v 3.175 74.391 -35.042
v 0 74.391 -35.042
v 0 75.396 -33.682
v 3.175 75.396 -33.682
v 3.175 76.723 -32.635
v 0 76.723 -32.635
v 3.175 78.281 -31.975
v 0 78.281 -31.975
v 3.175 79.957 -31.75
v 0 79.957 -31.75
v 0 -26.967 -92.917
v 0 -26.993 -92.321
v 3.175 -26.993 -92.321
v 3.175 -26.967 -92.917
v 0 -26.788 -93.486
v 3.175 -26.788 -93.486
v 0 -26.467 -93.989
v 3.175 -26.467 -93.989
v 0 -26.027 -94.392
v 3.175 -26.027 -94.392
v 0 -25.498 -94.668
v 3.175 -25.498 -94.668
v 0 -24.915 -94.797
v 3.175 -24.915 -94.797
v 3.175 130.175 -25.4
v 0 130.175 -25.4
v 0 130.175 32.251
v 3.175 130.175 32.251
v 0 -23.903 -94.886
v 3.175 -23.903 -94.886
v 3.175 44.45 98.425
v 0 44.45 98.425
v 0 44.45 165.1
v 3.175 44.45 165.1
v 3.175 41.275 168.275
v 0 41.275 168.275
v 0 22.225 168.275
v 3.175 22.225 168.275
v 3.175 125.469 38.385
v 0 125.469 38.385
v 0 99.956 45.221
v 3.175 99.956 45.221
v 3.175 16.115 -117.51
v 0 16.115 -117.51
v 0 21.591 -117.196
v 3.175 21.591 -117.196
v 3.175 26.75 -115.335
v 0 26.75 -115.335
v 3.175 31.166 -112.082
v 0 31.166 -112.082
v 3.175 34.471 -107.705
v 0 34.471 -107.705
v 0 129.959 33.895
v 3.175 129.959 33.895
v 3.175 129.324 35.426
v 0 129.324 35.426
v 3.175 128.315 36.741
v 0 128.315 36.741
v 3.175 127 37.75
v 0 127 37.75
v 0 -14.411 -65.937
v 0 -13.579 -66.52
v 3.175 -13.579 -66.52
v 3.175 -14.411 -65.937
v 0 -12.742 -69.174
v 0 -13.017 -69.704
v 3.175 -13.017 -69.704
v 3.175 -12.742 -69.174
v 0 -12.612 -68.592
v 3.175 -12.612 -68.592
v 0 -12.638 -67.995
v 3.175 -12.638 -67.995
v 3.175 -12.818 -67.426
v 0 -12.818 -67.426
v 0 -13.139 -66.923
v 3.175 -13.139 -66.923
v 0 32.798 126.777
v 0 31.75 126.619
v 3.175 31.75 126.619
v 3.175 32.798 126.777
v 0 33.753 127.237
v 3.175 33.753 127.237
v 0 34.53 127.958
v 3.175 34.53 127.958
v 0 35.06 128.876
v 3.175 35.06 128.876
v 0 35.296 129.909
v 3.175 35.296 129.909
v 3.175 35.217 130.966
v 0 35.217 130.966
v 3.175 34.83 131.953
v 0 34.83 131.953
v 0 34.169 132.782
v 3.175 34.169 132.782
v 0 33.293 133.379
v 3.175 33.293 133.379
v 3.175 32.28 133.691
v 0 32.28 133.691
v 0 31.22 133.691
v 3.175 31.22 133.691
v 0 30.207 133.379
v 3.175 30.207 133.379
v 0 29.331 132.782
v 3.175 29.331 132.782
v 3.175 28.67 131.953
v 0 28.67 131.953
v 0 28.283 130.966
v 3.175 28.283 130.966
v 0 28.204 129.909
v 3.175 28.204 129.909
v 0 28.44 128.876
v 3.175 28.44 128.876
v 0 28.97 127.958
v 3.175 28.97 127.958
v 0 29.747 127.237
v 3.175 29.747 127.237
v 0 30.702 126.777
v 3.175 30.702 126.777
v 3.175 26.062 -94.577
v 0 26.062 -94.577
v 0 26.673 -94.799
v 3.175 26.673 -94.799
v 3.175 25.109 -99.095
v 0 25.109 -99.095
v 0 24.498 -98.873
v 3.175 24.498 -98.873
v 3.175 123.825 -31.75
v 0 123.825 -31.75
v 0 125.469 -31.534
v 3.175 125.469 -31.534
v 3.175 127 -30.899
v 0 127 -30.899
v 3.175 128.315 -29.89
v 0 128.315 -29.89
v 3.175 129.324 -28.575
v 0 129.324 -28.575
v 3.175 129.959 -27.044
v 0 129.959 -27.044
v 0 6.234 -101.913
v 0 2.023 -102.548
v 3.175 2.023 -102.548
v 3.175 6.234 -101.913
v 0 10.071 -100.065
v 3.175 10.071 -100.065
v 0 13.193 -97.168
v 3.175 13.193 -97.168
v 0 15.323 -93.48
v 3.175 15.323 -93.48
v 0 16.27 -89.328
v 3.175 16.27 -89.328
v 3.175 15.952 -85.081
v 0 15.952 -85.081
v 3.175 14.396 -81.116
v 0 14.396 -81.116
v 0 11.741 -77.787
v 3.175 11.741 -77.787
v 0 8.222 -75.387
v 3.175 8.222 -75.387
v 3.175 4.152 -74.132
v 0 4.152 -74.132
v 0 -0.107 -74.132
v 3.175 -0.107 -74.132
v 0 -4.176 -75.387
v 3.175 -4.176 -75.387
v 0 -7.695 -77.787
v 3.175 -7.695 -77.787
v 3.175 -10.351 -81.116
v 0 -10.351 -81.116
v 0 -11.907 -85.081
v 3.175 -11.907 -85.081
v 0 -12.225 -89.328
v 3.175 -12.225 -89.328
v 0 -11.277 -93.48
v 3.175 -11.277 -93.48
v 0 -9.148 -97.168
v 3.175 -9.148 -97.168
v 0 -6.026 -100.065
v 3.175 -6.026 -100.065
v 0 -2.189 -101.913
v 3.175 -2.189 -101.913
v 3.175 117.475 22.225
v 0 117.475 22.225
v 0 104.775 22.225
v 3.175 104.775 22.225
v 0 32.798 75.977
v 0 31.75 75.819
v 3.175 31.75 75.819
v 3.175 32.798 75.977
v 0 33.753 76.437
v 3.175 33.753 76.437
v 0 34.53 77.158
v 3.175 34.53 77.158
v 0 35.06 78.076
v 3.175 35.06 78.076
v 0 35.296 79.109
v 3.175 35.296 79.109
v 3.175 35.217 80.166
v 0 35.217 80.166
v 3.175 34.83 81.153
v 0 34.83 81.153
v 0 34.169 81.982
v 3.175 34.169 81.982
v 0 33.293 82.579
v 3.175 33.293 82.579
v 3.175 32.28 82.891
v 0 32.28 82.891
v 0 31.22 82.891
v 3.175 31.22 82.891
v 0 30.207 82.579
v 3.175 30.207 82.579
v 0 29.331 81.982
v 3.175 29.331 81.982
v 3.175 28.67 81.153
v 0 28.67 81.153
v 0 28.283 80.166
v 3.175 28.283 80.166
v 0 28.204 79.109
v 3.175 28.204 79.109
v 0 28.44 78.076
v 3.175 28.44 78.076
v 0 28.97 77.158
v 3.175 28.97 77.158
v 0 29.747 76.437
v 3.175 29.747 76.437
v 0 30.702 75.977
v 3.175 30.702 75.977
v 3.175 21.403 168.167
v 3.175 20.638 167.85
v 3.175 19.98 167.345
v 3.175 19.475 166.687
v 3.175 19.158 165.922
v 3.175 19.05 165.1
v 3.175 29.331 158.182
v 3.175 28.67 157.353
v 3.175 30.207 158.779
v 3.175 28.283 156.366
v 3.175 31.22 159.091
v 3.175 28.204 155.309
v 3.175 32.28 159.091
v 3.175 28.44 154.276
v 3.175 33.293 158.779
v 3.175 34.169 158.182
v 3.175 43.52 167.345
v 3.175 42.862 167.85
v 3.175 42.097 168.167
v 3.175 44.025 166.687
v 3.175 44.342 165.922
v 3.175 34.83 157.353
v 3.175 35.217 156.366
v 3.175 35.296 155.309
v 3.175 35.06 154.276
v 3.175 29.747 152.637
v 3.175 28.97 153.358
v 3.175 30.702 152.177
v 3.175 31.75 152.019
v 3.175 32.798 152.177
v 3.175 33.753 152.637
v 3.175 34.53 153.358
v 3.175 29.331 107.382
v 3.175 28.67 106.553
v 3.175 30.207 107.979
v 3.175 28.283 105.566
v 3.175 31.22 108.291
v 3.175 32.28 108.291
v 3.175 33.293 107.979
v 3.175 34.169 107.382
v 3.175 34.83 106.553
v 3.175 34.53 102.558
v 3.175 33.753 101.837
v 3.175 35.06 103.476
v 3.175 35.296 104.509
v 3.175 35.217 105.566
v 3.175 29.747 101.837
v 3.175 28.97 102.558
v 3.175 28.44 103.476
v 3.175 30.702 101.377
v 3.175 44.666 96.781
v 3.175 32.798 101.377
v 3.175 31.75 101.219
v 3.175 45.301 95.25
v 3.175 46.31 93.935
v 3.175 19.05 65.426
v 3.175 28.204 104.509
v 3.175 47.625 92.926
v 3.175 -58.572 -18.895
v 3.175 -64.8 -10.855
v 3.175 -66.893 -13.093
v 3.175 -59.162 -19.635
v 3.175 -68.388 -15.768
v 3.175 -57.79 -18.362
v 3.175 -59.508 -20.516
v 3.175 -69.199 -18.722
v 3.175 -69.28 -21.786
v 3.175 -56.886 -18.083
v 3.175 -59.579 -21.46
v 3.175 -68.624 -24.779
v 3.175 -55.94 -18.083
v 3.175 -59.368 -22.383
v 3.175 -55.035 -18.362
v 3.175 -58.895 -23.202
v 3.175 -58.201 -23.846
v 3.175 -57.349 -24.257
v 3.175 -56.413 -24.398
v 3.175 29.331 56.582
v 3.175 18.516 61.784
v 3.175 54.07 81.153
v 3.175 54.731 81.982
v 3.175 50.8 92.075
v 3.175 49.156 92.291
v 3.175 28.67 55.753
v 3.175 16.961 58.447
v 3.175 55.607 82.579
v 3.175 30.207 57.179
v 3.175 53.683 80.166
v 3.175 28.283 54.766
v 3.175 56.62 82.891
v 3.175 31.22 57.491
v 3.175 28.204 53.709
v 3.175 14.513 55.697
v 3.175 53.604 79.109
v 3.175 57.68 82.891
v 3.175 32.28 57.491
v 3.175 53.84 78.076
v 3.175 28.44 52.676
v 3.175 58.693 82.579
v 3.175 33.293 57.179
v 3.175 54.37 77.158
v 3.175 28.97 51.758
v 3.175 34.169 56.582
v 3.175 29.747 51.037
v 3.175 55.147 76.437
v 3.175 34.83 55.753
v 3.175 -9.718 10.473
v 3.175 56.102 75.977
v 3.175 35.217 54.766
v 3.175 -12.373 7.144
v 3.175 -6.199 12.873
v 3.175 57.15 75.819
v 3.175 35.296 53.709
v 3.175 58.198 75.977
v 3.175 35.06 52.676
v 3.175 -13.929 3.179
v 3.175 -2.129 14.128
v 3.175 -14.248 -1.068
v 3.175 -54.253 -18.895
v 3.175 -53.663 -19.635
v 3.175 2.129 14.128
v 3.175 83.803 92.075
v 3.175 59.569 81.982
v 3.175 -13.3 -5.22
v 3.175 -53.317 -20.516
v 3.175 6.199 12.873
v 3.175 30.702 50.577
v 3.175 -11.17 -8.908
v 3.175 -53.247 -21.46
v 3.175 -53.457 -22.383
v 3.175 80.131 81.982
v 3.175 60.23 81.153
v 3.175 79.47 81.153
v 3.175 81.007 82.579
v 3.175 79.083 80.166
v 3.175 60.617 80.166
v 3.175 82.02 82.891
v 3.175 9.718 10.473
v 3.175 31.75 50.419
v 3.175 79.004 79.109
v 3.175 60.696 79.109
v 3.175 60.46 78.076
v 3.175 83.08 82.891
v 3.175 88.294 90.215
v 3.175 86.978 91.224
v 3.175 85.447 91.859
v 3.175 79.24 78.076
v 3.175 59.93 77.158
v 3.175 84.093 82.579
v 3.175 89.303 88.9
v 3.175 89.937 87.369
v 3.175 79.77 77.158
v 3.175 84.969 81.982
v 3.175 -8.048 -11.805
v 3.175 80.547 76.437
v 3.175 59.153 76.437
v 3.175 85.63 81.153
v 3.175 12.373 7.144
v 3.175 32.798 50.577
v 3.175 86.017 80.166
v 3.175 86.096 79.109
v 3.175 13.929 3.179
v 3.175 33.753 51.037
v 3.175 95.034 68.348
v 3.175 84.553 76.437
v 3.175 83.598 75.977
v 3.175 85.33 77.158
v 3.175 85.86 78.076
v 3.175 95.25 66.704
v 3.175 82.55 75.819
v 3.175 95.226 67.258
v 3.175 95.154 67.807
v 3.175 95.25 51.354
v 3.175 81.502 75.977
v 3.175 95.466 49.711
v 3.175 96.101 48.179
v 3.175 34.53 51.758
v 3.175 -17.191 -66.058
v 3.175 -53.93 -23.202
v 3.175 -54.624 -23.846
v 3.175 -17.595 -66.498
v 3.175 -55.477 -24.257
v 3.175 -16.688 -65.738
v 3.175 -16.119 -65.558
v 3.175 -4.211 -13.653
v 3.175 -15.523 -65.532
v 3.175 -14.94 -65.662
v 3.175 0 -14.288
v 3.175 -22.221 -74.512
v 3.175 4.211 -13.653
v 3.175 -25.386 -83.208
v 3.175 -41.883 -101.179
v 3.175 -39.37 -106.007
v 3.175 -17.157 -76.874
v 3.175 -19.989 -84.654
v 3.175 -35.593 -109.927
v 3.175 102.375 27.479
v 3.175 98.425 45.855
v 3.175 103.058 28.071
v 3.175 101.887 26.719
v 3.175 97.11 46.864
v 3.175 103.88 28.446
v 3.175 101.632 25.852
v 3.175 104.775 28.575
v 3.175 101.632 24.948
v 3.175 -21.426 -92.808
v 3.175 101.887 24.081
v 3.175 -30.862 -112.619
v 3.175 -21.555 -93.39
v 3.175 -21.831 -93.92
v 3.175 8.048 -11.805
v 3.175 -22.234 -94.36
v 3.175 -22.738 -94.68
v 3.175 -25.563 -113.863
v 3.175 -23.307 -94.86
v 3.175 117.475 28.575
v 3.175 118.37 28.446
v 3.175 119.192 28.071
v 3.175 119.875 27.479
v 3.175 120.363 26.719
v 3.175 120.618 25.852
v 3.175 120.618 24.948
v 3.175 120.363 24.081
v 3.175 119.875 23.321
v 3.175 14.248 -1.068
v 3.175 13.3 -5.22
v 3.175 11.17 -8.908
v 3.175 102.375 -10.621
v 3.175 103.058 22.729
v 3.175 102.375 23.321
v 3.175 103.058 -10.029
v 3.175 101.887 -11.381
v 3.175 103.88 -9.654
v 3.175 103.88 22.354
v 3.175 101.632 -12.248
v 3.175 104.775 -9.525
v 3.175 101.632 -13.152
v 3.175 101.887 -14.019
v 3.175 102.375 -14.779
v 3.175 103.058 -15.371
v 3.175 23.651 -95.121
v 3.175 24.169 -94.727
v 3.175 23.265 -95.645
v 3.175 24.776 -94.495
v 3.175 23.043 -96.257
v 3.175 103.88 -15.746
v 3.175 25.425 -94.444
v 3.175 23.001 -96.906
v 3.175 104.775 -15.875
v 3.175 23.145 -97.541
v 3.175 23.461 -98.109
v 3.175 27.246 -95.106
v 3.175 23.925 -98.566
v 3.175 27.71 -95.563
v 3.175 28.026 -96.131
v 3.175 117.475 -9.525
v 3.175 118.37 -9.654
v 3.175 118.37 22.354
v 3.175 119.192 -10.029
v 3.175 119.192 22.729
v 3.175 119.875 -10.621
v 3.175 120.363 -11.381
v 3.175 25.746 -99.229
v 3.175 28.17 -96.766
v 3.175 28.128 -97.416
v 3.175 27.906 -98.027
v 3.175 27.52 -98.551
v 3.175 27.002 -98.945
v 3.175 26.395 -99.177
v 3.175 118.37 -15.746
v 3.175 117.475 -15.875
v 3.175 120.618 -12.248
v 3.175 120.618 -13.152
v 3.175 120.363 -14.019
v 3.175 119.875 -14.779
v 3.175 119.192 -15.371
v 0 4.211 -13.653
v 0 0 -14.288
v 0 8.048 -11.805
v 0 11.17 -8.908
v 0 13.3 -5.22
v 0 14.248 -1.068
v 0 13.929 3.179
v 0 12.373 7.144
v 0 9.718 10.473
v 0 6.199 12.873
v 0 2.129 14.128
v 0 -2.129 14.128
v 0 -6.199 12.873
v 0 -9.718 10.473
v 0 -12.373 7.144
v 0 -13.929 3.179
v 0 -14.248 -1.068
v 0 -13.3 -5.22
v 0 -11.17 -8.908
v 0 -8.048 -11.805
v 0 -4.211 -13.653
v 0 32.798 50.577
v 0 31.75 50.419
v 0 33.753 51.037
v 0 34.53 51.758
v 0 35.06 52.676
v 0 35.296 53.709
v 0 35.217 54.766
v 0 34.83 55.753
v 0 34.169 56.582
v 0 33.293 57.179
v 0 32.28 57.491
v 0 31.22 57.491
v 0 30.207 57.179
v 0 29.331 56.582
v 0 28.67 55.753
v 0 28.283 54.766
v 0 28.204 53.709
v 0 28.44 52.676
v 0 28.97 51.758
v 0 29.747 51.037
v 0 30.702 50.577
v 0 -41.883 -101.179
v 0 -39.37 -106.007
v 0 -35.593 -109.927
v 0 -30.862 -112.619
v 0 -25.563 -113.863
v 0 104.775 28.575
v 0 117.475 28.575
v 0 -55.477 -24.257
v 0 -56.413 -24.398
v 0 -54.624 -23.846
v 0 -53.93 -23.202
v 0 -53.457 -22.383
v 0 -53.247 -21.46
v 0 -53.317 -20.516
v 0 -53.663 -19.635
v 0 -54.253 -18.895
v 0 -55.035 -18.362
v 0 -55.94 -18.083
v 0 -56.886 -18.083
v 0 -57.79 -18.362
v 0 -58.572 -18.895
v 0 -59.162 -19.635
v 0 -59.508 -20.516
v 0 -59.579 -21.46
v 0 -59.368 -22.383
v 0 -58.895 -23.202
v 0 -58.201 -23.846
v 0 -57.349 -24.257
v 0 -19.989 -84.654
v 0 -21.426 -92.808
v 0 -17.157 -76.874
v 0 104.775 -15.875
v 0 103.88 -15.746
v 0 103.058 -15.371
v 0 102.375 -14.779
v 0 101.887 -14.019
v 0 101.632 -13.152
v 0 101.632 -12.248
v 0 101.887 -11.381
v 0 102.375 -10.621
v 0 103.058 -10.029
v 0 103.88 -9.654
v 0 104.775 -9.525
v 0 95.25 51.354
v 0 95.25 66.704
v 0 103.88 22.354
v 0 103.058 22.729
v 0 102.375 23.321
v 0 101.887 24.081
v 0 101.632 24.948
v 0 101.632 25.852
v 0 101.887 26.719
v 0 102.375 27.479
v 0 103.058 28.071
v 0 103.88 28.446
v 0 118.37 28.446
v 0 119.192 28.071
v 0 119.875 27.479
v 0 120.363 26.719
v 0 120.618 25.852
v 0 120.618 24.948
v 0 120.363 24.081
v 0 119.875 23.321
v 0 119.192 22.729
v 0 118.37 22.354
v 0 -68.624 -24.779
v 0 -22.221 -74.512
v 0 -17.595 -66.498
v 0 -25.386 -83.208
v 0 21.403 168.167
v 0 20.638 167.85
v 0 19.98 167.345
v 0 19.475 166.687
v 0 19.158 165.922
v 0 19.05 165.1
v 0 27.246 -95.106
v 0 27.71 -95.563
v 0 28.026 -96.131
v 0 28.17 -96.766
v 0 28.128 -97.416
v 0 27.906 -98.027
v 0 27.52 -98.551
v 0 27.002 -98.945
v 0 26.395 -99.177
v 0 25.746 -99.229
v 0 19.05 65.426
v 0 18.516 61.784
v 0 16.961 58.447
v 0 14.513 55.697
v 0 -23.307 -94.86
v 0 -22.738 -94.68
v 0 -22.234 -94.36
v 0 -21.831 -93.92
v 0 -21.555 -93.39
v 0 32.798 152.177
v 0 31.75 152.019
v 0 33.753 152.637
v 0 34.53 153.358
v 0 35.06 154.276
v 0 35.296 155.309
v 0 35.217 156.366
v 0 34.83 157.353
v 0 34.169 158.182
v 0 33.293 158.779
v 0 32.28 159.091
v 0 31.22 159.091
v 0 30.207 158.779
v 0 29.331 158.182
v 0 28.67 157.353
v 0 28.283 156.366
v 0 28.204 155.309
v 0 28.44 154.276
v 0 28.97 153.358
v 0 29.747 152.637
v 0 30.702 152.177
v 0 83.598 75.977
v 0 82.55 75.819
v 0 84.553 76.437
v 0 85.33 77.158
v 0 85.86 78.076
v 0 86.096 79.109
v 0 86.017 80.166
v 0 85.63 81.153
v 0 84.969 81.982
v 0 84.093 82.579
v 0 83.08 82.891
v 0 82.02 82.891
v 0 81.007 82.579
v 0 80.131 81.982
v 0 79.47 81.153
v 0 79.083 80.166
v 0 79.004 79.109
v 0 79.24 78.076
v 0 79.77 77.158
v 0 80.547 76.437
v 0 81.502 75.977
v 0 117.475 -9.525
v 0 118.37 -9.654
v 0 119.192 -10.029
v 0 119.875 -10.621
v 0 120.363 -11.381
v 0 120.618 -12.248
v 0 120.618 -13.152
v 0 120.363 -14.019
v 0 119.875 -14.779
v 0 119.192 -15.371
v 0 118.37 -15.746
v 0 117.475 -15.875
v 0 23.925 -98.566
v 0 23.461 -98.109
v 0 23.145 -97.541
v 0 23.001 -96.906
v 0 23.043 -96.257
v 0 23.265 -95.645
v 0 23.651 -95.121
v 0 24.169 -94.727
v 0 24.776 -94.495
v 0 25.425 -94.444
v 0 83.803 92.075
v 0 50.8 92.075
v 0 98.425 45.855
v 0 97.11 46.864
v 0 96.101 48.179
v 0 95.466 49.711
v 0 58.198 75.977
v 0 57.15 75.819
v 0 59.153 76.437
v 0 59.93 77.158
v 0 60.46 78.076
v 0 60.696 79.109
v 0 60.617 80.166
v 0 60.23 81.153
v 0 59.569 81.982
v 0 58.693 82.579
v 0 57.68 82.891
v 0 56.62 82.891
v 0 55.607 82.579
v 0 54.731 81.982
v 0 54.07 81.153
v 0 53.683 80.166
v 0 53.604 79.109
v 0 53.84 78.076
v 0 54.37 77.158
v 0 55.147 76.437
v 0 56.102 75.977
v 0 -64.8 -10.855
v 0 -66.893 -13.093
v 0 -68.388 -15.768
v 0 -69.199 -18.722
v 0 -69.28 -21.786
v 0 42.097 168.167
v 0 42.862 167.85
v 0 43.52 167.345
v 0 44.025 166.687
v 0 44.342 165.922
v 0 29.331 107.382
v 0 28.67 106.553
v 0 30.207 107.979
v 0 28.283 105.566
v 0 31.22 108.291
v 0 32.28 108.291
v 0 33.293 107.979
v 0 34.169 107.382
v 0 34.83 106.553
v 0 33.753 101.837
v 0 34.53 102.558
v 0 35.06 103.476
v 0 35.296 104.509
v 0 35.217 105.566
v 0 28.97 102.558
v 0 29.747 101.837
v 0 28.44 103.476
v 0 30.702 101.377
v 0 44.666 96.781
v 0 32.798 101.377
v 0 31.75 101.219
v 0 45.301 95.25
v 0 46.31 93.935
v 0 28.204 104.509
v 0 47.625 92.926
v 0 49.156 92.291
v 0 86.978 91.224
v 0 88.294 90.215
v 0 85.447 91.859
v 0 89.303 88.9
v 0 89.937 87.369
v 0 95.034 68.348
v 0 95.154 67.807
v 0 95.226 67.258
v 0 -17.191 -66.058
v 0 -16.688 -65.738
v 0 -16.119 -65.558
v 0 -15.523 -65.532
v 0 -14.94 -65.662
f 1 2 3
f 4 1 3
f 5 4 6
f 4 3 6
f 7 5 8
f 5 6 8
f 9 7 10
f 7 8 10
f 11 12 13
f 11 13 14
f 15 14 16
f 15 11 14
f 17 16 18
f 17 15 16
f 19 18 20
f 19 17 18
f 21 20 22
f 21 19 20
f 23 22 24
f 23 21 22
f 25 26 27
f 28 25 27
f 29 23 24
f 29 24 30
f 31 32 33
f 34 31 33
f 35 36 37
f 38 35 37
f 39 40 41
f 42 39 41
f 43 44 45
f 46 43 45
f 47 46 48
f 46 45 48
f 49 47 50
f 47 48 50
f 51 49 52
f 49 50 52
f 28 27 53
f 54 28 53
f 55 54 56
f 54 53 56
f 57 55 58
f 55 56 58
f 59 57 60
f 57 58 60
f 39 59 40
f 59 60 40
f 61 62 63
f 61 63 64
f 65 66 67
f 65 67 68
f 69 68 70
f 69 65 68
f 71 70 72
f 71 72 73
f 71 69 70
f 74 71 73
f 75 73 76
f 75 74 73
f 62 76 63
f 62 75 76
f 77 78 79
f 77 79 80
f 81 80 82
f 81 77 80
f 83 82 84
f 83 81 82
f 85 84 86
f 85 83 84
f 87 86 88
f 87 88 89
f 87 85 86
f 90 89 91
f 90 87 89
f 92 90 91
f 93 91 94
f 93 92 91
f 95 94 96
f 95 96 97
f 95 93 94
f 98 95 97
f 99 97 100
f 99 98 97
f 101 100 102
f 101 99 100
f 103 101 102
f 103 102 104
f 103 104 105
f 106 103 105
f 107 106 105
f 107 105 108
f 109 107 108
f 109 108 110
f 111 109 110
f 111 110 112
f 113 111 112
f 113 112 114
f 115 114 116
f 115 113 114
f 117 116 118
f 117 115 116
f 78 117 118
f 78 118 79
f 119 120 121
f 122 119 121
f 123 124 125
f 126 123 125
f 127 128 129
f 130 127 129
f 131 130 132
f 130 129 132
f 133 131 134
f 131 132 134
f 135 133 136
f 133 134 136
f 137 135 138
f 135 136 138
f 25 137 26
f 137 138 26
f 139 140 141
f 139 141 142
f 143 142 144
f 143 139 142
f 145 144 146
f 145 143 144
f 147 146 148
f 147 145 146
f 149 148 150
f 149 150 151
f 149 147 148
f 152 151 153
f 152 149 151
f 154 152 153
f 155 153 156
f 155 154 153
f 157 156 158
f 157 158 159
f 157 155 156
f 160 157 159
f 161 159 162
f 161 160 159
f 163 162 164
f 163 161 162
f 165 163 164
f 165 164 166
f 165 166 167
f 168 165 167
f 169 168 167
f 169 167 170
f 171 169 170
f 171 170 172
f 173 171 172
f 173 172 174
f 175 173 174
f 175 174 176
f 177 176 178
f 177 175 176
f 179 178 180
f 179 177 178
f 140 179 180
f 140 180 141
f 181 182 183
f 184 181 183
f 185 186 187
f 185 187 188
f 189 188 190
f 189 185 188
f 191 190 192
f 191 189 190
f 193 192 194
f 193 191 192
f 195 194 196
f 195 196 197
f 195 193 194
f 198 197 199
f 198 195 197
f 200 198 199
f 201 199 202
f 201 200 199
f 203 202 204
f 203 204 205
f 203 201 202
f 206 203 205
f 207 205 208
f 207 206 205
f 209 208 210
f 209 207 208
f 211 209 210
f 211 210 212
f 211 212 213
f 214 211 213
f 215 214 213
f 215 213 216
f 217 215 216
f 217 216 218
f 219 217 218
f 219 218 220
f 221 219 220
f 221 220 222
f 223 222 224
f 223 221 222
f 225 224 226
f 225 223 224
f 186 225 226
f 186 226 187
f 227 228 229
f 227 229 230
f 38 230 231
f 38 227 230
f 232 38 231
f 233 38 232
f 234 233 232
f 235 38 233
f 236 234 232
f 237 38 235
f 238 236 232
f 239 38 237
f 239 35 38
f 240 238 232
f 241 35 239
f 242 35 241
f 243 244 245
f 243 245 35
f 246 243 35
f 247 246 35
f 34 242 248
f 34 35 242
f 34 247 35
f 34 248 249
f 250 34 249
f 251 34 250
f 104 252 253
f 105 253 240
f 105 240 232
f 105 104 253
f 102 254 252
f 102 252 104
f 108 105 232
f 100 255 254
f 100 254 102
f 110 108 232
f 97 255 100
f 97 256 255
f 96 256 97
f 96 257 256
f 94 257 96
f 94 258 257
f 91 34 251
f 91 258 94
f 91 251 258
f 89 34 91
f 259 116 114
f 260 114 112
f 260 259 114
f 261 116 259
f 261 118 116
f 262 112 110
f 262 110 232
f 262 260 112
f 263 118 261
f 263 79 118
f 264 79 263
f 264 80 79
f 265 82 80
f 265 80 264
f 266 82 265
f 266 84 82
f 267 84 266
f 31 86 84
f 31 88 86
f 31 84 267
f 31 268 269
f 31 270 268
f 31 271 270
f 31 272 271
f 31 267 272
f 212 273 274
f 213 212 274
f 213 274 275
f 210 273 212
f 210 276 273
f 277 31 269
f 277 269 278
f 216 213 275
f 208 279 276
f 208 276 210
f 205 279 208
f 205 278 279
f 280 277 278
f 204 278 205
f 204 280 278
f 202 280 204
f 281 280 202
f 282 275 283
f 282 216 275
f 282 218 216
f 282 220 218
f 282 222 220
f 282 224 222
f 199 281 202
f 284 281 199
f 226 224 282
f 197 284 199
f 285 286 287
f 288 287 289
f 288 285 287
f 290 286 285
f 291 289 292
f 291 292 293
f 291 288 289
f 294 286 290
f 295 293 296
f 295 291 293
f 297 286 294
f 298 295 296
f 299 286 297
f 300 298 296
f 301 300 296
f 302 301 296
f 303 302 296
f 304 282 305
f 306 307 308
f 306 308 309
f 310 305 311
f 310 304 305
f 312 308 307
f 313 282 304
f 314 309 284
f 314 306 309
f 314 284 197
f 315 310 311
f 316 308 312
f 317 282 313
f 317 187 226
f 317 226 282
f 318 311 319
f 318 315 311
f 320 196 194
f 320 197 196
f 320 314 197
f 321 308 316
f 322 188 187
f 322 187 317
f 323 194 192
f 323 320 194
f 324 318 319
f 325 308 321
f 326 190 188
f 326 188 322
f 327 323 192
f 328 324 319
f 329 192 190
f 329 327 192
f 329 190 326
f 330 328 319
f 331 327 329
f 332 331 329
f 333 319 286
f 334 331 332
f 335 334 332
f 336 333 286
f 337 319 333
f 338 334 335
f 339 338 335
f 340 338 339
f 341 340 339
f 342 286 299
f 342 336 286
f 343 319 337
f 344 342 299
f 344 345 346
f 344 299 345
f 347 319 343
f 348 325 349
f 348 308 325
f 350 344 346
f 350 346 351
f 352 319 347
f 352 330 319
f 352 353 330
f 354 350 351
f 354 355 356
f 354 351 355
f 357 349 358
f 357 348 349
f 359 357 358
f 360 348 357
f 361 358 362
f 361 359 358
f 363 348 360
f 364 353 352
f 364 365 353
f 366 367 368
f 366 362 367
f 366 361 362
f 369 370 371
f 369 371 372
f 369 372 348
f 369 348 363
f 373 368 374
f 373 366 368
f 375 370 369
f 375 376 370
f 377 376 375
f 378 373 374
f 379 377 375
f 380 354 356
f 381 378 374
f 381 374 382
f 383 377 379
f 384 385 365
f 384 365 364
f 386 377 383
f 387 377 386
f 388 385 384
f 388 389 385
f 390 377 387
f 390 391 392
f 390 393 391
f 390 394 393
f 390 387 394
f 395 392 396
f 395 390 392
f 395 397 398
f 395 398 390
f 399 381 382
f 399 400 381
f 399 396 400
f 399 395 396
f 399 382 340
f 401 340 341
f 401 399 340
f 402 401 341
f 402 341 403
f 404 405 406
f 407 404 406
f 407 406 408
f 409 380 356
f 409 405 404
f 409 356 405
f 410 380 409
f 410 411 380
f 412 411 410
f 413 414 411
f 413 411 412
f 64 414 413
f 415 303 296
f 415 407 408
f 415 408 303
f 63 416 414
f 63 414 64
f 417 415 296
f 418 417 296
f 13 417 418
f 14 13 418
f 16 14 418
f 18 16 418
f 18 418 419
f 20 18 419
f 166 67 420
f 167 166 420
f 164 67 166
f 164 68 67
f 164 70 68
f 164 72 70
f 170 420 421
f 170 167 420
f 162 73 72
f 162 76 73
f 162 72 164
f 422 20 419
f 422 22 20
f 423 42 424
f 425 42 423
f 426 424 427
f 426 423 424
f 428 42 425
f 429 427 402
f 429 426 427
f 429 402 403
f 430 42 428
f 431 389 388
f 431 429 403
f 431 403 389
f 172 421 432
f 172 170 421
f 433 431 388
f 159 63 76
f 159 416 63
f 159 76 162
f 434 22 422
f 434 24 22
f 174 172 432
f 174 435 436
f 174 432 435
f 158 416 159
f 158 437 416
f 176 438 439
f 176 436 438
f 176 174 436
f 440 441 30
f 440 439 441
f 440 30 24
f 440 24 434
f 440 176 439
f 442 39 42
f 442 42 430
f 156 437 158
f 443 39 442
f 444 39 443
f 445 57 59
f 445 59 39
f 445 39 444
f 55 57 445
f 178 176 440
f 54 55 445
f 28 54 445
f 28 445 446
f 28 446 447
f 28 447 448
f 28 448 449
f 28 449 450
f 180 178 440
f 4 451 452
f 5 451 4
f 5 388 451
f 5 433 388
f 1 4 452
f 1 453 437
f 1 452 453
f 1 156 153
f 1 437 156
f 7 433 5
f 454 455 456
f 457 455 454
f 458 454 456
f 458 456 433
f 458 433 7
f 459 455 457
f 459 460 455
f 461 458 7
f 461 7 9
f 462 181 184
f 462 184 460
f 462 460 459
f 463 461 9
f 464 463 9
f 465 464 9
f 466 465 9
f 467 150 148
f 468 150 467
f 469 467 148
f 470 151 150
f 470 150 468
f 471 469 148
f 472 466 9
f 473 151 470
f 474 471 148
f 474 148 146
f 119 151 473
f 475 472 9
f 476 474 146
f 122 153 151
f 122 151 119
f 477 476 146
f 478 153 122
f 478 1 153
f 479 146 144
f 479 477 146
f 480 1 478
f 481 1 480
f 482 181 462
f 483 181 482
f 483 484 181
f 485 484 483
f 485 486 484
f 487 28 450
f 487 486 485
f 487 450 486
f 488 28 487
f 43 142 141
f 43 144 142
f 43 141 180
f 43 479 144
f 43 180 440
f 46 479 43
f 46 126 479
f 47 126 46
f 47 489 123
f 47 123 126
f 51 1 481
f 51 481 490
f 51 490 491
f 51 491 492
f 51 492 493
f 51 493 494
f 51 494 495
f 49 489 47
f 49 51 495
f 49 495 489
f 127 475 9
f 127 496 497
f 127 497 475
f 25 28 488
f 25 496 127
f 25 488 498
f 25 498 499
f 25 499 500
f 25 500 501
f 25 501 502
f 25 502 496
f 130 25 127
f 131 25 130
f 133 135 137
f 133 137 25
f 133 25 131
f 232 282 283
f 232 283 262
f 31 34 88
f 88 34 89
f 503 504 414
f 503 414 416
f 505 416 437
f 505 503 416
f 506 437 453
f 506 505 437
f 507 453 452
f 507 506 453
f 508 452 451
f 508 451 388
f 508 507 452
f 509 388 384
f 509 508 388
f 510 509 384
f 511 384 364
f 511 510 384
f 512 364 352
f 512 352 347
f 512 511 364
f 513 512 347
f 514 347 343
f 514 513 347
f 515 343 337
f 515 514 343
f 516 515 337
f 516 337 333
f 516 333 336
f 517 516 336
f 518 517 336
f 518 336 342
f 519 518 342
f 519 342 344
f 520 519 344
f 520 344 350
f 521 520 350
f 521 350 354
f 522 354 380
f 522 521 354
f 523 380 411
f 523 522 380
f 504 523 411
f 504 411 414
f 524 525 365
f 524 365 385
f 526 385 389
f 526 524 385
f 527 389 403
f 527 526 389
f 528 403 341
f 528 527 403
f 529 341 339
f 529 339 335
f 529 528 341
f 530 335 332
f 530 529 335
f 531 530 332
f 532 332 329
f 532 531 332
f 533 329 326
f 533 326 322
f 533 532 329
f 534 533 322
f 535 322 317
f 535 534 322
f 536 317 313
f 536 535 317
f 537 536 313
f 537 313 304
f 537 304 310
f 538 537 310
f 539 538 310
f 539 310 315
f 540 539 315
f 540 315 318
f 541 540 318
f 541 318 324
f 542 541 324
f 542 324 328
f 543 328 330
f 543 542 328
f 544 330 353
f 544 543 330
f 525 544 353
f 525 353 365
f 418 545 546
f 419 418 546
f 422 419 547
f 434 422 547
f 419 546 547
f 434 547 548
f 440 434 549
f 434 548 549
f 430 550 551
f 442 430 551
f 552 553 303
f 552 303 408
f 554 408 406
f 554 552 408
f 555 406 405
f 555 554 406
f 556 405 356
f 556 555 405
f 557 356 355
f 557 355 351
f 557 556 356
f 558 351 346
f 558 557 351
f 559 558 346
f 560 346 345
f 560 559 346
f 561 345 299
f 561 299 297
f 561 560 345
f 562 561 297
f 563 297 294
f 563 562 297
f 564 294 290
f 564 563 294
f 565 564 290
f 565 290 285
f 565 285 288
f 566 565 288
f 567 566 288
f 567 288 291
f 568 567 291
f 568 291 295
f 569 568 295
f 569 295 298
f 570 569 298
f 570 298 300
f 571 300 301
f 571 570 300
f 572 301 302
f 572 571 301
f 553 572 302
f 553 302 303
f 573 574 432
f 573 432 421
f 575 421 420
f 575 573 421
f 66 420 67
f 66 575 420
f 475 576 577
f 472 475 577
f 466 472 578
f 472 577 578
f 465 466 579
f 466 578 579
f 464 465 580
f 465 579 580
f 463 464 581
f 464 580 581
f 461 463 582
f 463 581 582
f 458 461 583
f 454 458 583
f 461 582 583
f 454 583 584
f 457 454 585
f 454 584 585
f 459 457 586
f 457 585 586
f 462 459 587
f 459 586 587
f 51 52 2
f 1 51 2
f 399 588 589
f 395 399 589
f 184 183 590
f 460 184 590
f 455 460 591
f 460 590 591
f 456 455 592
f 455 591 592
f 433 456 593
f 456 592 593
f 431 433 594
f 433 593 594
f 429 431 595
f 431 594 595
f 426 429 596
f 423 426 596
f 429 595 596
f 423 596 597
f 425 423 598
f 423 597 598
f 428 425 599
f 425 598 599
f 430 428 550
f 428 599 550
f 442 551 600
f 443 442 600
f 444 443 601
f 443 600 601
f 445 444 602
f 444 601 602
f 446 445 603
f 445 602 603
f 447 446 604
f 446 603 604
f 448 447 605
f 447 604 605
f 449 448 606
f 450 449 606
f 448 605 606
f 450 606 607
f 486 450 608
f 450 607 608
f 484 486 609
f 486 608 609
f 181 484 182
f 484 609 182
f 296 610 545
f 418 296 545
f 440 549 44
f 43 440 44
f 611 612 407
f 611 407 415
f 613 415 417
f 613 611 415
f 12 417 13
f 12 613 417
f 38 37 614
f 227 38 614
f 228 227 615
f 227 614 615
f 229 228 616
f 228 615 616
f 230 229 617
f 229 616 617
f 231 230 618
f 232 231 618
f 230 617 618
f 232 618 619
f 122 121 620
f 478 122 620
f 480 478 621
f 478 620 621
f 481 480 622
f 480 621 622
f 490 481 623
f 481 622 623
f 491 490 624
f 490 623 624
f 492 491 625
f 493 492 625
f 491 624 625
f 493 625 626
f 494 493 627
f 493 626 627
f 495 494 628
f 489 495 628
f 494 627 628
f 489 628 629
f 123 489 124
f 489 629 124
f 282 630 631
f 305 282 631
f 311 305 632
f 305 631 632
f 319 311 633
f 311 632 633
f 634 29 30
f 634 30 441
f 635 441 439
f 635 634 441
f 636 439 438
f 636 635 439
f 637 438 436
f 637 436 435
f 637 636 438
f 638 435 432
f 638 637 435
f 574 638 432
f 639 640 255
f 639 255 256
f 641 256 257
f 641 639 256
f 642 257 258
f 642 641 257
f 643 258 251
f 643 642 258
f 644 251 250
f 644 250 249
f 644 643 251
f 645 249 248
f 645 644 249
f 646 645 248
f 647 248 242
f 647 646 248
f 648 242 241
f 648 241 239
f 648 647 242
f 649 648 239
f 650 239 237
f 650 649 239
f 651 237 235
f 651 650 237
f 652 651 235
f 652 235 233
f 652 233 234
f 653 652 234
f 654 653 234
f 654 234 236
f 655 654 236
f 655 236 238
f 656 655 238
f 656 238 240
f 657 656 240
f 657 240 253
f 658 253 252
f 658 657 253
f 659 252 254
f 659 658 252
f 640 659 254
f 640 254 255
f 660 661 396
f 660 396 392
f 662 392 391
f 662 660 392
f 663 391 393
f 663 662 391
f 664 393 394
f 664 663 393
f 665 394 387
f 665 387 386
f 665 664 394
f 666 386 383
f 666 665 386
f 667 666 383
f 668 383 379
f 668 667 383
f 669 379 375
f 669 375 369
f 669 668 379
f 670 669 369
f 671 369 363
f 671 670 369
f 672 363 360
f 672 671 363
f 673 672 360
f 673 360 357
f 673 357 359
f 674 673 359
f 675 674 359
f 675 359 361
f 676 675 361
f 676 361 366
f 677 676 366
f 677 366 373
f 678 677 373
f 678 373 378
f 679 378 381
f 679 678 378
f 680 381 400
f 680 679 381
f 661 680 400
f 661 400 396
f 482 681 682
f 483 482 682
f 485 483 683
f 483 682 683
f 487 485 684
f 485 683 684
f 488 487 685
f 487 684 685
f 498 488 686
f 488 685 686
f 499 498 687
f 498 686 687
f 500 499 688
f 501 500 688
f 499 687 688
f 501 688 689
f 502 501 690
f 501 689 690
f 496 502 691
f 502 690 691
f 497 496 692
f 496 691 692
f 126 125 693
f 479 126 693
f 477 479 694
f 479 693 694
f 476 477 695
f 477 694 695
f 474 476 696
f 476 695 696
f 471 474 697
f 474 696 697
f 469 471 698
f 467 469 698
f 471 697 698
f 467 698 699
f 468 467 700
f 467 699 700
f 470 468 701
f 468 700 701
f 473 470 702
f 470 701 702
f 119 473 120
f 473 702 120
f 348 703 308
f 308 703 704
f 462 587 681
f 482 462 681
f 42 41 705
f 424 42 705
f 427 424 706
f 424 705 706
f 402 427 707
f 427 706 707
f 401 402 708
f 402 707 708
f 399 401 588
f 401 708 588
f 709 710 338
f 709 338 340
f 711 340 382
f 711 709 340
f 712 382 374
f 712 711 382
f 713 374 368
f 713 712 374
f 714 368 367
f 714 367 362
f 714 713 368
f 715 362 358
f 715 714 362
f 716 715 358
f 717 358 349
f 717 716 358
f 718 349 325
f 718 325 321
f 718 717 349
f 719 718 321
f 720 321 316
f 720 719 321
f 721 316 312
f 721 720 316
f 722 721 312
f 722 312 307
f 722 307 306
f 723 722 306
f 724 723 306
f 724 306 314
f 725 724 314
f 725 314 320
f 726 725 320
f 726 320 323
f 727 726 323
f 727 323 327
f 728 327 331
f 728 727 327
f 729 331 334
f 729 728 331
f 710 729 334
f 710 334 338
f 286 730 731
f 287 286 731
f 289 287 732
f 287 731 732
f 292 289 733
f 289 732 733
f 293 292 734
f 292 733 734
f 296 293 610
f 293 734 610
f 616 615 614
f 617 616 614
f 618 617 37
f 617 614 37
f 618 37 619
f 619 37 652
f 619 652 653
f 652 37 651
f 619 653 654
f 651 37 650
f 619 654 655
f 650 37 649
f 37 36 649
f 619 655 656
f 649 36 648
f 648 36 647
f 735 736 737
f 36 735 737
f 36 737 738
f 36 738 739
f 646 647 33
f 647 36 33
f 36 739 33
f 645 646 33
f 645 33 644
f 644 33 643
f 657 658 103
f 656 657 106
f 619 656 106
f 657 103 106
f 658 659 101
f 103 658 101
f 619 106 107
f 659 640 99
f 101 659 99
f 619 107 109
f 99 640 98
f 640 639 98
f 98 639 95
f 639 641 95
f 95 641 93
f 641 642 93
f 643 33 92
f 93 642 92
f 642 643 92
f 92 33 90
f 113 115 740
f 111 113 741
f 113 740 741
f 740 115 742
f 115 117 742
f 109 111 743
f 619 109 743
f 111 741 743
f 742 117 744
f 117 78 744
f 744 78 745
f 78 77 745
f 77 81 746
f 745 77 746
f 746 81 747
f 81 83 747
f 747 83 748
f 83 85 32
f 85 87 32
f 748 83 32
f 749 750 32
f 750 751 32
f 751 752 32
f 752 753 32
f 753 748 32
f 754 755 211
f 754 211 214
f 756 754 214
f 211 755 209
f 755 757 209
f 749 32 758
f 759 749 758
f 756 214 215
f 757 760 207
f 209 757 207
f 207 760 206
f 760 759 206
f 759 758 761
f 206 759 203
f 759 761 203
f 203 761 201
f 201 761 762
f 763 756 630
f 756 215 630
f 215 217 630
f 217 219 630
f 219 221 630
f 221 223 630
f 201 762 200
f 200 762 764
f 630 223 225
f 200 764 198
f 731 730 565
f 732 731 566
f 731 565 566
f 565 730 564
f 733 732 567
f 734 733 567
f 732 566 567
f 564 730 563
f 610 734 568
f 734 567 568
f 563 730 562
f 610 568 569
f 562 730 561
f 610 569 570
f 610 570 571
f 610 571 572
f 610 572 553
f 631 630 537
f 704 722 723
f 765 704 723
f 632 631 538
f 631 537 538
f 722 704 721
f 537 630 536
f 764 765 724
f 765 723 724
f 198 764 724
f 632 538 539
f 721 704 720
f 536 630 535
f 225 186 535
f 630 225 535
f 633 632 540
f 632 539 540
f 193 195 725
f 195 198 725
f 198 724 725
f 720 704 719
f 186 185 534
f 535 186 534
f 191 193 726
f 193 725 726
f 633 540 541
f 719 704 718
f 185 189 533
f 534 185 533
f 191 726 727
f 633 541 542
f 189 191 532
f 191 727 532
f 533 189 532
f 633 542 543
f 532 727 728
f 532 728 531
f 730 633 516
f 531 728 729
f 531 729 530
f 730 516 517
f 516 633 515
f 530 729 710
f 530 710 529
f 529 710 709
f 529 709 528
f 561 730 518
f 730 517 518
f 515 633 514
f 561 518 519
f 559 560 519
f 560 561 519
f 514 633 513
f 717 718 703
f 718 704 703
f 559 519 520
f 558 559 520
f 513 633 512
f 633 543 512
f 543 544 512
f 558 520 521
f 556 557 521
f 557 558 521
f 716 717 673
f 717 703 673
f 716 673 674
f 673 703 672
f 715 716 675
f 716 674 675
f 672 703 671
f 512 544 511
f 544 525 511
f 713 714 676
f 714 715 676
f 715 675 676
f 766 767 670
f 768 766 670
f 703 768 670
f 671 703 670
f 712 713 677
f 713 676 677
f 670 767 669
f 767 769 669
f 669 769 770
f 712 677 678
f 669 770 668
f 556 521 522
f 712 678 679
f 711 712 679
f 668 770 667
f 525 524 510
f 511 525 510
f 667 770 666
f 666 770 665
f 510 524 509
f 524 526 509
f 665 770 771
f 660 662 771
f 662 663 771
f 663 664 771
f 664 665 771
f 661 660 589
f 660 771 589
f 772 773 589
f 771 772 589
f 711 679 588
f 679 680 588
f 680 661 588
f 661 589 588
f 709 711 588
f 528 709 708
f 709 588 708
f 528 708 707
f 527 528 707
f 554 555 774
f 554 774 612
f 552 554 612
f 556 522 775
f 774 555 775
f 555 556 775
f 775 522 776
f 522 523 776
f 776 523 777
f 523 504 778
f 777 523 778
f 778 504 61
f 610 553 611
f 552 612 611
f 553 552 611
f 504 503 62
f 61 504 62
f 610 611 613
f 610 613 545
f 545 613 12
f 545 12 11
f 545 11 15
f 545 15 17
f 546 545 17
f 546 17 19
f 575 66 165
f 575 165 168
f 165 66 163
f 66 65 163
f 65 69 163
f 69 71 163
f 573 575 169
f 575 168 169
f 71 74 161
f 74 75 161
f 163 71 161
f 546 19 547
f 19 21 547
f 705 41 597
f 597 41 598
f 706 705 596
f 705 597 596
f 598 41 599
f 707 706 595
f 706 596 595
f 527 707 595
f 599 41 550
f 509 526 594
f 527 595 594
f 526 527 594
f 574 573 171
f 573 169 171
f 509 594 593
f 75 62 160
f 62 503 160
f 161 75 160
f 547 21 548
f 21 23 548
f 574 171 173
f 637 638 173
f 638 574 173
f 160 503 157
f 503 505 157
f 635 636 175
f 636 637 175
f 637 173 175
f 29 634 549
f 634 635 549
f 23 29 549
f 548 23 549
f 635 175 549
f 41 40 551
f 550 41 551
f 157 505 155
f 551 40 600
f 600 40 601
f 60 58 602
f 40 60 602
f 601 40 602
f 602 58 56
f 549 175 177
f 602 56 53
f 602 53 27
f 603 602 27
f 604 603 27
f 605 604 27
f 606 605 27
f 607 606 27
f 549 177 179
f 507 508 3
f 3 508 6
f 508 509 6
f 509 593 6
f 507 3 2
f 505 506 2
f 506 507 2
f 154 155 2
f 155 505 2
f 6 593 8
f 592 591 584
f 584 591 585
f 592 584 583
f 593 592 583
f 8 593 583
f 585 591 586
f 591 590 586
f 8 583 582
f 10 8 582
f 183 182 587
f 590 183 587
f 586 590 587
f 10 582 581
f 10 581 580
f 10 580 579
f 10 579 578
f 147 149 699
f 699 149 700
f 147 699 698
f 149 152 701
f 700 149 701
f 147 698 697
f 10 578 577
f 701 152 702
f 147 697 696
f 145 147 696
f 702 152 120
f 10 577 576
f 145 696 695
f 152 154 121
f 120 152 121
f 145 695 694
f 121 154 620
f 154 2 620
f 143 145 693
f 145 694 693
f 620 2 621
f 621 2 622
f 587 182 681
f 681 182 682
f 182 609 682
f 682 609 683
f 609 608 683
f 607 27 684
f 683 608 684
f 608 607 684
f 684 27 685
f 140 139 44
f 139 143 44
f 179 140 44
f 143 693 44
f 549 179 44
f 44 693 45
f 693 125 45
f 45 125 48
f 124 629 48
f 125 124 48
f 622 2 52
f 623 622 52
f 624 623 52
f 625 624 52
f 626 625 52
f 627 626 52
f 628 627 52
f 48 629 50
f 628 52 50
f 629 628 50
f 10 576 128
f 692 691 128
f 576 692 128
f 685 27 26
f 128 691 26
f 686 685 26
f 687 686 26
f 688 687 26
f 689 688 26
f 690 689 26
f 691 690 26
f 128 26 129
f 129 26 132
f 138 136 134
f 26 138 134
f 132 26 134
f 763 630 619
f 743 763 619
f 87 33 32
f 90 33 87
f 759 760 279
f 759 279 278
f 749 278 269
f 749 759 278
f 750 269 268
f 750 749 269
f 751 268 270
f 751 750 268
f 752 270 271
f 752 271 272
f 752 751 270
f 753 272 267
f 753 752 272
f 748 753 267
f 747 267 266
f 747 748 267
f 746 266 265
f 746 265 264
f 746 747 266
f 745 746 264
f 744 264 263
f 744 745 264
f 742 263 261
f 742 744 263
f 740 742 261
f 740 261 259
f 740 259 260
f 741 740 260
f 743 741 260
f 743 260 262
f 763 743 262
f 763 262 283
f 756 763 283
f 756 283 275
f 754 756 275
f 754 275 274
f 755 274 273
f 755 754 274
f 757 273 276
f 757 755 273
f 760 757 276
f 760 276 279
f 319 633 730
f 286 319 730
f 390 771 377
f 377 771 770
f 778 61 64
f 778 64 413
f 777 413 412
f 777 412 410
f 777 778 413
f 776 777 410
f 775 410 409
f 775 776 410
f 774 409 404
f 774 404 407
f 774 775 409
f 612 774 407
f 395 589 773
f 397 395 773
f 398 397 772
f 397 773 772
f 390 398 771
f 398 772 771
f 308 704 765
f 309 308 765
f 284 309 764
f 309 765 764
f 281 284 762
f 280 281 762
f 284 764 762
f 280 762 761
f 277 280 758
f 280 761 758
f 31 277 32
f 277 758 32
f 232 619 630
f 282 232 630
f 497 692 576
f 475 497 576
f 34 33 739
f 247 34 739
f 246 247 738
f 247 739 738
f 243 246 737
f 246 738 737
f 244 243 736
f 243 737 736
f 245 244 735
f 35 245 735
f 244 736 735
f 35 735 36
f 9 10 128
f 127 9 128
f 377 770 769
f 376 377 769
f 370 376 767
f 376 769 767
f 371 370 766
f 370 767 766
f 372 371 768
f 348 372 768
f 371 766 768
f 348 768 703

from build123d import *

# Parameters (mm, degrees)
SKETCH2_R           = 14.2875
SKETCH2_R_2         = 3.556
SKETCH2_R_3         = 3.175
BOSS_EXTRUDE1_DEPTH = 3.175


with BuildPart() as part:
    # Sketch2 → Boss-Extrude1 (new body)
    with BuildSketch(Plane(origin=(0, 0, 0), x_dir=(0, 0, -1), z_dir=(1, 0, 0))):
        with BuildLine():
            Line((-165.1, 19.05), (-65.425970741, 19.05))
            ThreePointArc((-65.425970741, 19.05), (-60.058718817, 17.860108895), (-55.697206313, 14.513402643))
            Line((-55.697206313, 14.513402643), (10.854621695, -64.799977479))
            ThreePointArc((10.854621695, -64.799977479), (17.220460091, -68.883236769), (24.778864428, -68.623566193))
            Line((24.778864428, -68.623566193), (101.178891774, -41.883356934))
            ThreePointArc((101.178891774, -41.883356934), (109.926930654, -35.593169628), (113.863183314, -25.563186798))
            Line((113.863183314, -25.563186798), (117.509534259, 16.114795214))
            ThreePointArc((117.509534259, 16.114795214), (115.335280515, 26.750250711), (107.704738864, 34.471333996))
            Line((107.704738864, 34.471333996), (35.042428799, 74.391177223))
            ThreePointArc((35.042428799, 74.391177223), (32.634742589, 76.723403199), (31.75, 79.956584517))
            Line((31.75, 79.956584517), (31.75, 123.825))
            ThreePointArc((31.75, 123.825), (29.890128061, 128.315128061), (25.4, 130.175))
            Line((25.4, 130.175), (-32.251185784, 130.175))
            ThreePointArc((-32.251185784, 130.175), (-36.116820858, 128.862793711), (-38.384814781, 125.468500936))
            Line((-38.384814781, 125.468500936), (-45.22073508, 99.956499064))
            ThreePointArc((-45.22073508, 99.956499064), (-47.488729003, 96.562206289), (-51.354364077, 95.25))
            Line((-51.354364077, 95.25), (-66.704490653, 95.25))
            ThreePointArc((-66.704490653, 95.25), (-67.533331973, 95.19567487), (-68.347991589, 95.033628997))
            Line((-68.347991589, 95.033628997), (-87.368500936, 89.937098878))
            ThreePointArc((-87.368500936, 89.937098878), (-90.762793711, 87.669104955), (-92.075, 83.803469881))
            Line((-92.075, 83.803469881), (-92.075, 50.8))
            ThreePointArc((-92.075, 50.8), (-93.934871939, 46.309871939), (-98.425, 44.45))
            Line((-98.425, 44.45), (-165.1, 44.45))
            ThreePointArc((-165.1, 44.45), (-167.34506403, 43.52006403), (-168.275, 41.275))
            Line((-168.275, 41.275), (-168.275, 22.225))
            ThreePointArc((-168.275, 22.225), (-167.34506403, 19.97993597), (-165.1, 19.05))
        make_face()
        Circle(SKETCH2_R, mode=Mode.SUBTRACT)
        with Locations((-53.975, 31.75)):
            Circle(SKETCH2_R_2, mode=Mode.SUBTRACT)
        with Locations((-79.375, 31.75)):
            Circle(SKETCH2_R_2, mode=Mode.SUBTRACT)
        with Locations((-104.775, 31.75)):
            Circle(SKETCH2_R_2, mode=Mode.SUBTRACT)
        with Locations((-130.175, 31.75)):
            Circle(SKETCH2_R_2, mode=Mode.SUBTRACT)
        with Locations((-155.575, 31.75)):
            Circle(SKETCH2_R_2, mode=Mode.SUBTRACT)
        with Locations((88.260023092, 2.022732411)):
            Circle(SKETCH2_R, mode=Mode.SUBTRACT)
        with Locations((-79.375, 57.15)):
            Circle(SKETCH2_R_2, mode=Mode.SUBTRACT)
        with Locations((-79.375, 82.55)):
            Circle(SKETCH2_R_2, mode=Mode.SUBTRACT)
        with Locations((21.222889041, -56.412747143)):
            Circle(SKETCH2_R_3, mode=Mode.SUBTRACT)
        with BuildLine():
            Line((94.576884308, 26.061982823), (94.799197401, 26.672783027))
            ThreePointArc((94.799197401, 26.672783027), (97.72919278, 28.03906231), (99.095472064, 25.109066932))
            Line((99.095472064, 25.109066932), (98.87315897, 24.498266728))
            ThreePointArc((98.87315897, 24.498266728), (95.943163592, 23.131987445), (94.576884308, 26.061982823))
        make_face(mode=Mode.SUBTRACT)
        with BuildLine():
            Line((66.519823852, -13.57854466), (65.937070193, -14.410803137))
            ThreePointArc((65.937070193, -14.410803137), (65.558381242, -16.118958605), (66.498456032, -17.594580444))
            ThreePointArc((66.498456032, -17.594580444), (78.790853404, -23.993597488), (92.320584973, -26.993066764))
            ThreePointArc((92.320584973, -26.993066764), (93.989235477, -26.466943281), (94.797124081, -24.915003712))
            Line((94.797124081, -24.915003712), (94.885674315, -23.902869899))
            ThreePointArc((94.885674315, -23.902869899), (94.359550833, -22.234219395), (92.807611263, -21.426330791))
            ThreePointArc((92.807611263, -21.426330791), (80.702061965, -18.742595123), (69.703601159, -13.01715882))
            ThreePointArc((69.703601159, -13.01715882), (67.995445691, -12.63846987), (66.519823852, -13.57854466))
        make_face(mode=Mode.SUBTRACT)
        with BuildLine():
            Line((-22.225, 117.475), (-22.225, 104.775))
            ThreePointArc((-22.225, 104.775), (-25.4, 101.6), (-28.575, 104.775))
            Line((-28.575, 104.775), (-28.575, 117.475))
            ThreePointArc((-28.575, 117.475), (-25.4, 120.65), (-22.225, 117.475))
        make_face(mode=Mode.SUBTRACT)
        with BuildLine():
            Line((15.875, 117.475), (15.875, 104.775))
            ThreePointArc((15.875, 104.775), (12.7, 101.6), (9.525, 104.775))
            Line((9.525, 104.775), (9.525, 117.475))
            ThreePointArc((9.525, 117.475), (12.7, 120.65), (15.875, 117.475))
        make_face(mode=Mode.SUBTRACT)
    extrude(amount=BOSS_EXTRUDE1_DEPTH)


solid = part.part
